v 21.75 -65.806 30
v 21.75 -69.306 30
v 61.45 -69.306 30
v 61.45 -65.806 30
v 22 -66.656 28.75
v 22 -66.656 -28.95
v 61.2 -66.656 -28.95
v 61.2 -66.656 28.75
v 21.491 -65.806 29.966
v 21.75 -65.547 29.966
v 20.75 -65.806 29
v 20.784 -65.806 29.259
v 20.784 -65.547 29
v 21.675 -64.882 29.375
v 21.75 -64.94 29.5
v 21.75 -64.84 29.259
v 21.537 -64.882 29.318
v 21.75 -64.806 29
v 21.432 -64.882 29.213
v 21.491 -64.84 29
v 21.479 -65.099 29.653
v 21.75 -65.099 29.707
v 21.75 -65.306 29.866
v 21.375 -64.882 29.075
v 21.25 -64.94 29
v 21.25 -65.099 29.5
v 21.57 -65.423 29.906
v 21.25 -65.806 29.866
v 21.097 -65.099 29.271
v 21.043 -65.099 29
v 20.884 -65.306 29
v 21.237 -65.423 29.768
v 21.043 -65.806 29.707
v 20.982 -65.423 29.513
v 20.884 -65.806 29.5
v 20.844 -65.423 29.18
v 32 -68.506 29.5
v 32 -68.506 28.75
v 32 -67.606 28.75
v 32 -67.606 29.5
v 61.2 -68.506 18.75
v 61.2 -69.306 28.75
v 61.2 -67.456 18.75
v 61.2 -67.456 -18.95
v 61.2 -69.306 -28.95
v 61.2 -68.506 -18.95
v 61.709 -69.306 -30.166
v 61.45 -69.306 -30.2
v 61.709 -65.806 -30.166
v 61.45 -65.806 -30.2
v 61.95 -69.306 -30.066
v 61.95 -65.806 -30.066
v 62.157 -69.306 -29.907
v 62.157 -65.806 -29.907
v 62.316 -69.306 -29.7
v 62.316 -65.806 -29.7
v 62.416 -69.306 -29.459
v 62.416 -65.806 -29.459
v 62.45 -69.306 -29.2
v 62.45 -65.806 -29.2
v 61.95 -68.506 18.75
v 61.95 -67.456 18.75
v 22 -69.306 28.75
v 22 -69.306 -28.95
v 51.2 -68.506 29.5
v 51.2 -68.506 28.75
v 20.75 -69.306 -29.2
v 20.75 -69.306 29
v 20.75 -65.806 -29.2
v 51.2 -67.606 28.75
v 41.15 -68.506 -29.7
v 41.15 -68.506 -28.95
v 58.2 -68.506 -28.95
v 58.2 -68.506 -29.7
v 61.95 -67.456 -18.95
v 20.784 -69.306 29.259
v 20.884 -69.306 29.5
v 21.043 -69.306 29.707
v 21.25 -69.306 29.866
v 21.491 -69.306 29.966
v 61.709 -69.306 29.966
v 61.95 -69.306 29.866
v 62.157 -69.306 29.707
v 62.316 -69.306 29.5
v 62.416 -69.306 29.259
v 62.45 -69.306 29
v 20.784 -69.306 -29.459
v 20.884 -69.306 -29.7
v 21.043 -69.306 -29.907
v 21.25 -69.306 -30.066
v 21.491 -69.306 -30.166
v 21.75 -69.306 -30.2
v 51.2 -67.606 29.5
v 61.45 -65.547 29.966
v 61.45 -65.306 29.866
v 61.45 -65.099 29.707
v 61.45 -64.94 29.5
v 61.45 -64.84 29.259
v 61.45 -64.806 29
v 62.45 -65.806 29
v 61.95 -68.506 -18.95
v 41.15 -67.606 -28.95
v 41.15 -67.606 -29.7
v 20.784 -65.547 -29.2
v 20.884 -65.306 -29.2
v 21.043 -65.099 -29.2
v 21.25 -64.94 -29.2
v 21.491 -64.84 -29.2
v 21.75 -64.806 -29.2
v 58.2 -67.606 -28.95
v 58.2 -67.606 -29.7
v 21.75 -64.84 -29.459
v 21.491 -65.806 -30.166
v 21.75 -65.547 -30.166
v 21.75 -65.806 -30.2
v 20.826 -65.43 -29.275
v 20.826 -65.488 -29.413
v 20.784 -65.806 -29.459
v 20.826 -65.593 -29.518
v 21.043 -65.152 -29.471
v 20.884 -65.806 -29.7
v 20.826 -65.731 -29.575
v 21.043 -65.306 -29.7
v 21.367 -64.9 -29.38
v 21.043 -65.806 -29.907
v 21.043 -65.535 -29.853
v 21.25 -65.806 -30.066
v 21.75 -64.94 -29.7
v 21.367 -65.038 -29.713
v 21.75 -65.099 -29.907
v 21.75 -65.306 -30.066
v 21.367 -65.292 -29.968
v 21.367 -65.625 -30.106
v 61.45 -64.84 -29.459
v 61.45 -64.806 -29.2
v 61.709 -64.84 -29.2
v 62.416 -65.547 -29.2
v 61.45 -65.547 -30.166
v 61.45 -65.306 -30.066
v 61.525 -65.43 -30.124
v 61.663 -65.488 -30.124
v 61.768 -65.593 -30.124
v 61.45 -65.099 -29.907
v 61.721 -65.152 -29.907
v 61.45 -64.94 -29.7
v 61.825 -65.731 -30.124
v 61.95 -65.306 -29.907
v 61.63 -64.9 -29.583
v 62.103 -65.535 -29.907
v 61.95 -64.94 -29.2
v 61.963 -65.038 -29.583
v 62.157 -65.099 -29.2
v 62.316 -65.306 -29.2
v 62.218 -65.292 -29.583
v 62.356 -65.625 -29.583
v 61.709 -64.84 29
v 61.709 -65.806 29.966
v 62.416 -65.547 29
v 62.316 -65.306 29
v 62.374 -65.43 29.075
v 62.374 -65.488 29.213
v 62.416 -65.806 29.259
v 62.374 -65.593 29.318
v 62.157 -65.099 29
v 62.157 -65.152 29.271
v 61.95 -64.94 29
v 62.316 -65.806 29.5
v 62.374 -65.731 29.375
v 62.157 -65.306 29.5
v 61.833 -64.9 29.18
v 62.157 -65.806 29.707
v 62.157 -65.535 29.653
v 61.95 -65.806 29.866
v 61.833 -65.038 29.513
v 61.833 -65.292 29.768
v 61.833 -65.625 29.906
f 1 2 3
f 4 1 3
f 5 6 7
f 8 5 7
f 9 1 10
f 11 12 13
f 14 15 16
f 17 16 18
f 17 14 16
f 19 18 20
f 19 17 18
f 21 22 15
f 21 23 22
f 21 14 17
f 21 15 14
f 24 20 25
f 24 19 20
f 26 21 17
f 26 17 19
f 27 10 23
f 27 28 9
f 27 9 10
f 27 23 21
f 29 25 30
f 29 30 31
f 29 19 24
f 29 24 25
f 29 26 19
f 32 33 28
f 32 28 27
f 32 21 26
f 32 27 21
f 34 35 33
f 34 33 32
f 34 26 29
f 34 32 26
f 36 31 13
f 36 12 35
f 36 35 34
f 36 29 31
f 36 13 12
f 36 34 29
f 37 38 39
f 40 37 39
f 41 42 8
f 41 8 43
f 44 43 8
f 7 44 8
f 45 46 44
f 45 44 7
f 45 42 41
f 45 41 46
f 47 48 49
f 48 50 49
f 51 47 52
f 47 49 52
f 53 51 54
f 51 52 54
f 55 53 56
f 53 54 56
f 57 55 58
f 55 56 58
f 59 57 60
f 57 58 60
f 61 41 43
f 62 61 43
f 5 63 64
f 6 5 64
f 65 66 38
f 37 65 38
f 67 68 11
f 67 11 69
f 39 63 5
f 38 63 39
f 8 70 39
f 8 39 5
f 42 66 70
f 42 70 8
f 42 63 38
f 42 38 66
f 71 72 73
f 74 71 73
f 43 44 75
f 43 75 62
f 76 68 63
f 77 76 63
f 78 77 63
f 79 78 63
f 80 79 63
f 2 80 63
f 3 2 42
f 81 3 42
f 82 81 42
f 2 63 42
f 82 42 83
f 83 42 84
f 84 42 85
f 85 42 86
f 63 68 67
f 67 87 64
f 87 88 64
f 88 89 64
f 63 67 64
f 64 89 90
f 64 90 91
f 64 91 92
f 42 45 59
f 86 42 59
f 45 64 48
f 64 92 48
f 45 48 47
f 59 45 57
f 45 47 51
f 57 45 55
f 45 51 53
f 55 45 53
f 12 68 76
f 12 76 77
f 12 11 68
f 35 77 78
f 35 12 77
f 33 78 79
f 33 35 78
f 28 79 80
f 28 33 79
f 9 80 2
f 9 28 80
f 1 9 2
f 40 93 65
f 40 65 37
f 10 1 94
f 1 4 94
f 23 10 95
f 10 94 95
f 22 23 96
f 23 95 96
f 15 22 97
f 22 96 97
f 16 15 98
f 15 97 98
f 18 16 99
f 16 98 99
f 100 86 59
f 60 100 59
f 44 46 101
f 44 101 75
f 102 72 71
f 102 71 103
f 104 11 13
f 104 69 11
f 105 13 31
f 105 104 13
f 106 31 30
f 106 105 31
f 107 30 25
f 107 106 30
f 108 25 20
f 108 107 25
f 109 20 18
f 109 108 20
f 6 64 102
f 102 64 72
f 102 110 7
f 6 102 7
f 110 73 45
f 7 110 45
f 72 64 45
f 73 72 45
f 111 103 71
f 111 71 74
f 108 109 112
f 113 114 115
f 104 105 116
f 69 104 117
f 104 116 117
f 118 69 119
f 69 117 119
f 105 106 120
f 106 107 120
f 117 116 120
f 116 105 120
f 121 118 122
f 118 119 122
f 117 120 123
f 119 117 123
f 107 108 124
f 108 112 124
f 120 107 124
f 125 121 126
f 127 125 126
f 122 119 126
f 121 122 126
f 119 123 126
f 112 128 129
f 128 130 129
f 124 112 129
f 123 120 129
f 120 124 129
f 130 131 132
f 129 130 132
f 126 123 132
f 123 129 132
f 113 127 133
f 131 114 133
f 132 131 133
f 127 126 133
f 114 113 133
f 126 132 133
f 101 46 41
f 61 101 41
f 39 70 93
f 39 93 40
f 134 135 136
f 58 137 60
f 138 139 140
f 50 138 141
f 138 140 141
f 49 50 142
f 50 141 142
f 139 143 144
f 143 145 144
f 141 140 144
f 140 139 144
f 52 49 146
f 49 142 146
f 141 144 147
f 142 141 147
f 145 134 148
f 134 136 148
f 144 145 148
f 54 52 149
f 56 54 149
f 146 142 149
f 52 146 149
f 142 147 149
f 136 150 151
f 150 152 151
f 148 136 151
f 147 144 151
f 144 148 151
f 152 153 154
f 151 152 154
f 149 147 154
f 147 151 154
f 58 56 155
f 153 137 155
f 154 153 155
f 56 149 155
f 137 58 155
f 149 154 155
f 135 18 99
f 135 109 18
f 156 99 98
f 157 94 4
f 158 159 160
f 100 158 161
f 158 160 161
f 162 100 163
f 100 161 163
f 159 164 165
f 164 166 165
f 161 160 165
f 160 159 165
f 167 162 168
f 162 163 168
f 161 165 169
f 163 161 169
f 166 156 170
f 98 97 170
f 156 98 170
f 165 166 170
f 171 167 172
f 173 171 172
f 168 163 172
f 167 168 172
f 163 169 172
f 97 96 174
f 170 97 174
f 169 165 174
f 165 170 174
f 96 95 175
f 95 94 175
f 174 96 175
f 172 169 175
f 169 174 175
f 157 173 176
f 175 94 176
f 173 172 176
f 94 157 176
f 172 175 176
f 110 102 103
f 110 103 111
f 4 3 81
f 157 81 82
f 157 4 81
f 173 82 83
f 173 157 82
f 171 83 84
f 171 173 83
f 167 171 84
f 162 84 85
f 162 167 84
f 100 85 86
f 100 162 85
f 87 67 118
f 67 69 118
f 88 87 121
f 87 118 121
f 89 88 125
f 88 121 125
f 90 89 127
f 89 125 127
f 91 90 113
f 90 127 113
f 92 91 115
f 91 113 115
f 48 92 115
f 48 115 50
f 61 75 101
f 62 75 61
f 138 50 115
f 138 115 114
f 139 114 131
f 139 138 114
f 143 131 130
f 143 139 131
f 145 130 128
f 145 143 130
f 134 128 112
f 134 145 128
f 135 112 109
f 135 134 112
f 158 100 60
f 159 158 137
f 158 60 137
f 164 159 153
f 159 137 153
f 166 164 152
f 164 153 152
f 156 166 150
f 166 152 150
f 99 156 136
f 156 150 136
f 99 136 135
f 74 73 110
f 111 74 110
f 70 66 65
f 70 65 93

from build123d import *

# Parameters (mm, degrees)
MAIN_LID_W          = 41.7
MAIN_LID_H          = 60.2
BOSS_EXTRUDE1_DEPTH = 4.5
MAIN_LID_3_W        = 39.2
MAIN_LID_3_H        = 57.7
CUT_EXTRUDE1_DEPTH  = 2.65
SKETCH2_W           = 17.05
SKETCH2_H           = 0.9
CUT_EXTRUDE2_DEPTH  = 0.75
SKETCH3_W           = 37.7
SKETCH3_H           = 1.05
CUT_EXTRUDE3_DEPTH  = 0.75
SKETCH4_W           = 19.2
SKETCH4_H           = 0.9
CUT_EXTRUDE4_DEPTH  = 0.75
FILLET1_R           = 1


with BuildPart() as part:
    # Main_Lid → Boss-Extrude1 (new body)
    with BuildSketch(Plane(origin=(0, -69.305732589, 0), x_dir=(1, 0, 0), z_dir=(0, 1, 0))):
        with Locations((41.6, 0.1)):
            Rectangle(MAIN_LID_W, MAIN_LID_H)
    extrude(amount=BOSS_EXTRUDE1_DEPTH)

    # Main_Lid<3> → Cut-Extrude1 (cut)
    with BuildSketch(Plane(origin=(0, -69.305732589, 0), x_dir=(1, 0, 0), z_dir=(0, 1, 0))):
        with Locations((41.6, 0.1)):
            Rectangle(MAIN_LID_3_W, MAIN_LID_3_H)
    extrude(amount=CUT_EXTRUDE1_DEPTH, mode=Mode.SUBTRACT)

    # Sketch2 → Cut-Extrude2 (cut)
    with BuildSketch(Plane.XY.offset(-28.95)):
        with Locations((49.675, -68.055732589)):
            Rectangle(SKETCH2_W, SKETCH2_H)
    extrude(amount=-CUT_EXTRUDE2_DEPTH, mode=Mode.SUBTRACT)

    # Sketch3 → Cut-Extrude3 (cut)
    with BuildSketch(Plane.ZY.offset(-61.2)):
        with Locations((-0.1, -67.980732589)):
            Rectangle(SKETCH3_W, SKETCH3_H)
    extrude(amount=-CUT_EXTRUDE3_DEPTH, mode=Mode.SUBTRACT)

    # Sketch4 → Cut-Extrude4 (cut)
    with BuildSketch(Plane(origin=(0, 0, 28.75), x_dir=(-1, 0, 0), z_dir=(0, 0, -1))):
        with Locations((-41.6, -68.055732589)):
            Rectangle(SKETCH4_W, SKETCH4_H)
    extrude(amount=-CUT_EXTRUDE4_DEPTH, mode=Mode.SUBTRACT)

    # Fillet1
    fillet1_edges = [part.edges().sort_by_distance(p)[0] for p in [
        (41.6, -64.805732589, -30.2),
        (41.6, -64.805732589, 30),
        (20.75, -64.805732589, -0.1),
        (20.75, -67.055732589, 30),
        (62.45, -67.055732589, 30),
        (20.75, -67.055732589, -30.2),
        (62.45, -67.055732589, -30.2),
        (62.45, -64.805732589, -0.1),
    ]]
    fillet(fillet1_edges, radius=FILLET1_R)


solid = part.part
